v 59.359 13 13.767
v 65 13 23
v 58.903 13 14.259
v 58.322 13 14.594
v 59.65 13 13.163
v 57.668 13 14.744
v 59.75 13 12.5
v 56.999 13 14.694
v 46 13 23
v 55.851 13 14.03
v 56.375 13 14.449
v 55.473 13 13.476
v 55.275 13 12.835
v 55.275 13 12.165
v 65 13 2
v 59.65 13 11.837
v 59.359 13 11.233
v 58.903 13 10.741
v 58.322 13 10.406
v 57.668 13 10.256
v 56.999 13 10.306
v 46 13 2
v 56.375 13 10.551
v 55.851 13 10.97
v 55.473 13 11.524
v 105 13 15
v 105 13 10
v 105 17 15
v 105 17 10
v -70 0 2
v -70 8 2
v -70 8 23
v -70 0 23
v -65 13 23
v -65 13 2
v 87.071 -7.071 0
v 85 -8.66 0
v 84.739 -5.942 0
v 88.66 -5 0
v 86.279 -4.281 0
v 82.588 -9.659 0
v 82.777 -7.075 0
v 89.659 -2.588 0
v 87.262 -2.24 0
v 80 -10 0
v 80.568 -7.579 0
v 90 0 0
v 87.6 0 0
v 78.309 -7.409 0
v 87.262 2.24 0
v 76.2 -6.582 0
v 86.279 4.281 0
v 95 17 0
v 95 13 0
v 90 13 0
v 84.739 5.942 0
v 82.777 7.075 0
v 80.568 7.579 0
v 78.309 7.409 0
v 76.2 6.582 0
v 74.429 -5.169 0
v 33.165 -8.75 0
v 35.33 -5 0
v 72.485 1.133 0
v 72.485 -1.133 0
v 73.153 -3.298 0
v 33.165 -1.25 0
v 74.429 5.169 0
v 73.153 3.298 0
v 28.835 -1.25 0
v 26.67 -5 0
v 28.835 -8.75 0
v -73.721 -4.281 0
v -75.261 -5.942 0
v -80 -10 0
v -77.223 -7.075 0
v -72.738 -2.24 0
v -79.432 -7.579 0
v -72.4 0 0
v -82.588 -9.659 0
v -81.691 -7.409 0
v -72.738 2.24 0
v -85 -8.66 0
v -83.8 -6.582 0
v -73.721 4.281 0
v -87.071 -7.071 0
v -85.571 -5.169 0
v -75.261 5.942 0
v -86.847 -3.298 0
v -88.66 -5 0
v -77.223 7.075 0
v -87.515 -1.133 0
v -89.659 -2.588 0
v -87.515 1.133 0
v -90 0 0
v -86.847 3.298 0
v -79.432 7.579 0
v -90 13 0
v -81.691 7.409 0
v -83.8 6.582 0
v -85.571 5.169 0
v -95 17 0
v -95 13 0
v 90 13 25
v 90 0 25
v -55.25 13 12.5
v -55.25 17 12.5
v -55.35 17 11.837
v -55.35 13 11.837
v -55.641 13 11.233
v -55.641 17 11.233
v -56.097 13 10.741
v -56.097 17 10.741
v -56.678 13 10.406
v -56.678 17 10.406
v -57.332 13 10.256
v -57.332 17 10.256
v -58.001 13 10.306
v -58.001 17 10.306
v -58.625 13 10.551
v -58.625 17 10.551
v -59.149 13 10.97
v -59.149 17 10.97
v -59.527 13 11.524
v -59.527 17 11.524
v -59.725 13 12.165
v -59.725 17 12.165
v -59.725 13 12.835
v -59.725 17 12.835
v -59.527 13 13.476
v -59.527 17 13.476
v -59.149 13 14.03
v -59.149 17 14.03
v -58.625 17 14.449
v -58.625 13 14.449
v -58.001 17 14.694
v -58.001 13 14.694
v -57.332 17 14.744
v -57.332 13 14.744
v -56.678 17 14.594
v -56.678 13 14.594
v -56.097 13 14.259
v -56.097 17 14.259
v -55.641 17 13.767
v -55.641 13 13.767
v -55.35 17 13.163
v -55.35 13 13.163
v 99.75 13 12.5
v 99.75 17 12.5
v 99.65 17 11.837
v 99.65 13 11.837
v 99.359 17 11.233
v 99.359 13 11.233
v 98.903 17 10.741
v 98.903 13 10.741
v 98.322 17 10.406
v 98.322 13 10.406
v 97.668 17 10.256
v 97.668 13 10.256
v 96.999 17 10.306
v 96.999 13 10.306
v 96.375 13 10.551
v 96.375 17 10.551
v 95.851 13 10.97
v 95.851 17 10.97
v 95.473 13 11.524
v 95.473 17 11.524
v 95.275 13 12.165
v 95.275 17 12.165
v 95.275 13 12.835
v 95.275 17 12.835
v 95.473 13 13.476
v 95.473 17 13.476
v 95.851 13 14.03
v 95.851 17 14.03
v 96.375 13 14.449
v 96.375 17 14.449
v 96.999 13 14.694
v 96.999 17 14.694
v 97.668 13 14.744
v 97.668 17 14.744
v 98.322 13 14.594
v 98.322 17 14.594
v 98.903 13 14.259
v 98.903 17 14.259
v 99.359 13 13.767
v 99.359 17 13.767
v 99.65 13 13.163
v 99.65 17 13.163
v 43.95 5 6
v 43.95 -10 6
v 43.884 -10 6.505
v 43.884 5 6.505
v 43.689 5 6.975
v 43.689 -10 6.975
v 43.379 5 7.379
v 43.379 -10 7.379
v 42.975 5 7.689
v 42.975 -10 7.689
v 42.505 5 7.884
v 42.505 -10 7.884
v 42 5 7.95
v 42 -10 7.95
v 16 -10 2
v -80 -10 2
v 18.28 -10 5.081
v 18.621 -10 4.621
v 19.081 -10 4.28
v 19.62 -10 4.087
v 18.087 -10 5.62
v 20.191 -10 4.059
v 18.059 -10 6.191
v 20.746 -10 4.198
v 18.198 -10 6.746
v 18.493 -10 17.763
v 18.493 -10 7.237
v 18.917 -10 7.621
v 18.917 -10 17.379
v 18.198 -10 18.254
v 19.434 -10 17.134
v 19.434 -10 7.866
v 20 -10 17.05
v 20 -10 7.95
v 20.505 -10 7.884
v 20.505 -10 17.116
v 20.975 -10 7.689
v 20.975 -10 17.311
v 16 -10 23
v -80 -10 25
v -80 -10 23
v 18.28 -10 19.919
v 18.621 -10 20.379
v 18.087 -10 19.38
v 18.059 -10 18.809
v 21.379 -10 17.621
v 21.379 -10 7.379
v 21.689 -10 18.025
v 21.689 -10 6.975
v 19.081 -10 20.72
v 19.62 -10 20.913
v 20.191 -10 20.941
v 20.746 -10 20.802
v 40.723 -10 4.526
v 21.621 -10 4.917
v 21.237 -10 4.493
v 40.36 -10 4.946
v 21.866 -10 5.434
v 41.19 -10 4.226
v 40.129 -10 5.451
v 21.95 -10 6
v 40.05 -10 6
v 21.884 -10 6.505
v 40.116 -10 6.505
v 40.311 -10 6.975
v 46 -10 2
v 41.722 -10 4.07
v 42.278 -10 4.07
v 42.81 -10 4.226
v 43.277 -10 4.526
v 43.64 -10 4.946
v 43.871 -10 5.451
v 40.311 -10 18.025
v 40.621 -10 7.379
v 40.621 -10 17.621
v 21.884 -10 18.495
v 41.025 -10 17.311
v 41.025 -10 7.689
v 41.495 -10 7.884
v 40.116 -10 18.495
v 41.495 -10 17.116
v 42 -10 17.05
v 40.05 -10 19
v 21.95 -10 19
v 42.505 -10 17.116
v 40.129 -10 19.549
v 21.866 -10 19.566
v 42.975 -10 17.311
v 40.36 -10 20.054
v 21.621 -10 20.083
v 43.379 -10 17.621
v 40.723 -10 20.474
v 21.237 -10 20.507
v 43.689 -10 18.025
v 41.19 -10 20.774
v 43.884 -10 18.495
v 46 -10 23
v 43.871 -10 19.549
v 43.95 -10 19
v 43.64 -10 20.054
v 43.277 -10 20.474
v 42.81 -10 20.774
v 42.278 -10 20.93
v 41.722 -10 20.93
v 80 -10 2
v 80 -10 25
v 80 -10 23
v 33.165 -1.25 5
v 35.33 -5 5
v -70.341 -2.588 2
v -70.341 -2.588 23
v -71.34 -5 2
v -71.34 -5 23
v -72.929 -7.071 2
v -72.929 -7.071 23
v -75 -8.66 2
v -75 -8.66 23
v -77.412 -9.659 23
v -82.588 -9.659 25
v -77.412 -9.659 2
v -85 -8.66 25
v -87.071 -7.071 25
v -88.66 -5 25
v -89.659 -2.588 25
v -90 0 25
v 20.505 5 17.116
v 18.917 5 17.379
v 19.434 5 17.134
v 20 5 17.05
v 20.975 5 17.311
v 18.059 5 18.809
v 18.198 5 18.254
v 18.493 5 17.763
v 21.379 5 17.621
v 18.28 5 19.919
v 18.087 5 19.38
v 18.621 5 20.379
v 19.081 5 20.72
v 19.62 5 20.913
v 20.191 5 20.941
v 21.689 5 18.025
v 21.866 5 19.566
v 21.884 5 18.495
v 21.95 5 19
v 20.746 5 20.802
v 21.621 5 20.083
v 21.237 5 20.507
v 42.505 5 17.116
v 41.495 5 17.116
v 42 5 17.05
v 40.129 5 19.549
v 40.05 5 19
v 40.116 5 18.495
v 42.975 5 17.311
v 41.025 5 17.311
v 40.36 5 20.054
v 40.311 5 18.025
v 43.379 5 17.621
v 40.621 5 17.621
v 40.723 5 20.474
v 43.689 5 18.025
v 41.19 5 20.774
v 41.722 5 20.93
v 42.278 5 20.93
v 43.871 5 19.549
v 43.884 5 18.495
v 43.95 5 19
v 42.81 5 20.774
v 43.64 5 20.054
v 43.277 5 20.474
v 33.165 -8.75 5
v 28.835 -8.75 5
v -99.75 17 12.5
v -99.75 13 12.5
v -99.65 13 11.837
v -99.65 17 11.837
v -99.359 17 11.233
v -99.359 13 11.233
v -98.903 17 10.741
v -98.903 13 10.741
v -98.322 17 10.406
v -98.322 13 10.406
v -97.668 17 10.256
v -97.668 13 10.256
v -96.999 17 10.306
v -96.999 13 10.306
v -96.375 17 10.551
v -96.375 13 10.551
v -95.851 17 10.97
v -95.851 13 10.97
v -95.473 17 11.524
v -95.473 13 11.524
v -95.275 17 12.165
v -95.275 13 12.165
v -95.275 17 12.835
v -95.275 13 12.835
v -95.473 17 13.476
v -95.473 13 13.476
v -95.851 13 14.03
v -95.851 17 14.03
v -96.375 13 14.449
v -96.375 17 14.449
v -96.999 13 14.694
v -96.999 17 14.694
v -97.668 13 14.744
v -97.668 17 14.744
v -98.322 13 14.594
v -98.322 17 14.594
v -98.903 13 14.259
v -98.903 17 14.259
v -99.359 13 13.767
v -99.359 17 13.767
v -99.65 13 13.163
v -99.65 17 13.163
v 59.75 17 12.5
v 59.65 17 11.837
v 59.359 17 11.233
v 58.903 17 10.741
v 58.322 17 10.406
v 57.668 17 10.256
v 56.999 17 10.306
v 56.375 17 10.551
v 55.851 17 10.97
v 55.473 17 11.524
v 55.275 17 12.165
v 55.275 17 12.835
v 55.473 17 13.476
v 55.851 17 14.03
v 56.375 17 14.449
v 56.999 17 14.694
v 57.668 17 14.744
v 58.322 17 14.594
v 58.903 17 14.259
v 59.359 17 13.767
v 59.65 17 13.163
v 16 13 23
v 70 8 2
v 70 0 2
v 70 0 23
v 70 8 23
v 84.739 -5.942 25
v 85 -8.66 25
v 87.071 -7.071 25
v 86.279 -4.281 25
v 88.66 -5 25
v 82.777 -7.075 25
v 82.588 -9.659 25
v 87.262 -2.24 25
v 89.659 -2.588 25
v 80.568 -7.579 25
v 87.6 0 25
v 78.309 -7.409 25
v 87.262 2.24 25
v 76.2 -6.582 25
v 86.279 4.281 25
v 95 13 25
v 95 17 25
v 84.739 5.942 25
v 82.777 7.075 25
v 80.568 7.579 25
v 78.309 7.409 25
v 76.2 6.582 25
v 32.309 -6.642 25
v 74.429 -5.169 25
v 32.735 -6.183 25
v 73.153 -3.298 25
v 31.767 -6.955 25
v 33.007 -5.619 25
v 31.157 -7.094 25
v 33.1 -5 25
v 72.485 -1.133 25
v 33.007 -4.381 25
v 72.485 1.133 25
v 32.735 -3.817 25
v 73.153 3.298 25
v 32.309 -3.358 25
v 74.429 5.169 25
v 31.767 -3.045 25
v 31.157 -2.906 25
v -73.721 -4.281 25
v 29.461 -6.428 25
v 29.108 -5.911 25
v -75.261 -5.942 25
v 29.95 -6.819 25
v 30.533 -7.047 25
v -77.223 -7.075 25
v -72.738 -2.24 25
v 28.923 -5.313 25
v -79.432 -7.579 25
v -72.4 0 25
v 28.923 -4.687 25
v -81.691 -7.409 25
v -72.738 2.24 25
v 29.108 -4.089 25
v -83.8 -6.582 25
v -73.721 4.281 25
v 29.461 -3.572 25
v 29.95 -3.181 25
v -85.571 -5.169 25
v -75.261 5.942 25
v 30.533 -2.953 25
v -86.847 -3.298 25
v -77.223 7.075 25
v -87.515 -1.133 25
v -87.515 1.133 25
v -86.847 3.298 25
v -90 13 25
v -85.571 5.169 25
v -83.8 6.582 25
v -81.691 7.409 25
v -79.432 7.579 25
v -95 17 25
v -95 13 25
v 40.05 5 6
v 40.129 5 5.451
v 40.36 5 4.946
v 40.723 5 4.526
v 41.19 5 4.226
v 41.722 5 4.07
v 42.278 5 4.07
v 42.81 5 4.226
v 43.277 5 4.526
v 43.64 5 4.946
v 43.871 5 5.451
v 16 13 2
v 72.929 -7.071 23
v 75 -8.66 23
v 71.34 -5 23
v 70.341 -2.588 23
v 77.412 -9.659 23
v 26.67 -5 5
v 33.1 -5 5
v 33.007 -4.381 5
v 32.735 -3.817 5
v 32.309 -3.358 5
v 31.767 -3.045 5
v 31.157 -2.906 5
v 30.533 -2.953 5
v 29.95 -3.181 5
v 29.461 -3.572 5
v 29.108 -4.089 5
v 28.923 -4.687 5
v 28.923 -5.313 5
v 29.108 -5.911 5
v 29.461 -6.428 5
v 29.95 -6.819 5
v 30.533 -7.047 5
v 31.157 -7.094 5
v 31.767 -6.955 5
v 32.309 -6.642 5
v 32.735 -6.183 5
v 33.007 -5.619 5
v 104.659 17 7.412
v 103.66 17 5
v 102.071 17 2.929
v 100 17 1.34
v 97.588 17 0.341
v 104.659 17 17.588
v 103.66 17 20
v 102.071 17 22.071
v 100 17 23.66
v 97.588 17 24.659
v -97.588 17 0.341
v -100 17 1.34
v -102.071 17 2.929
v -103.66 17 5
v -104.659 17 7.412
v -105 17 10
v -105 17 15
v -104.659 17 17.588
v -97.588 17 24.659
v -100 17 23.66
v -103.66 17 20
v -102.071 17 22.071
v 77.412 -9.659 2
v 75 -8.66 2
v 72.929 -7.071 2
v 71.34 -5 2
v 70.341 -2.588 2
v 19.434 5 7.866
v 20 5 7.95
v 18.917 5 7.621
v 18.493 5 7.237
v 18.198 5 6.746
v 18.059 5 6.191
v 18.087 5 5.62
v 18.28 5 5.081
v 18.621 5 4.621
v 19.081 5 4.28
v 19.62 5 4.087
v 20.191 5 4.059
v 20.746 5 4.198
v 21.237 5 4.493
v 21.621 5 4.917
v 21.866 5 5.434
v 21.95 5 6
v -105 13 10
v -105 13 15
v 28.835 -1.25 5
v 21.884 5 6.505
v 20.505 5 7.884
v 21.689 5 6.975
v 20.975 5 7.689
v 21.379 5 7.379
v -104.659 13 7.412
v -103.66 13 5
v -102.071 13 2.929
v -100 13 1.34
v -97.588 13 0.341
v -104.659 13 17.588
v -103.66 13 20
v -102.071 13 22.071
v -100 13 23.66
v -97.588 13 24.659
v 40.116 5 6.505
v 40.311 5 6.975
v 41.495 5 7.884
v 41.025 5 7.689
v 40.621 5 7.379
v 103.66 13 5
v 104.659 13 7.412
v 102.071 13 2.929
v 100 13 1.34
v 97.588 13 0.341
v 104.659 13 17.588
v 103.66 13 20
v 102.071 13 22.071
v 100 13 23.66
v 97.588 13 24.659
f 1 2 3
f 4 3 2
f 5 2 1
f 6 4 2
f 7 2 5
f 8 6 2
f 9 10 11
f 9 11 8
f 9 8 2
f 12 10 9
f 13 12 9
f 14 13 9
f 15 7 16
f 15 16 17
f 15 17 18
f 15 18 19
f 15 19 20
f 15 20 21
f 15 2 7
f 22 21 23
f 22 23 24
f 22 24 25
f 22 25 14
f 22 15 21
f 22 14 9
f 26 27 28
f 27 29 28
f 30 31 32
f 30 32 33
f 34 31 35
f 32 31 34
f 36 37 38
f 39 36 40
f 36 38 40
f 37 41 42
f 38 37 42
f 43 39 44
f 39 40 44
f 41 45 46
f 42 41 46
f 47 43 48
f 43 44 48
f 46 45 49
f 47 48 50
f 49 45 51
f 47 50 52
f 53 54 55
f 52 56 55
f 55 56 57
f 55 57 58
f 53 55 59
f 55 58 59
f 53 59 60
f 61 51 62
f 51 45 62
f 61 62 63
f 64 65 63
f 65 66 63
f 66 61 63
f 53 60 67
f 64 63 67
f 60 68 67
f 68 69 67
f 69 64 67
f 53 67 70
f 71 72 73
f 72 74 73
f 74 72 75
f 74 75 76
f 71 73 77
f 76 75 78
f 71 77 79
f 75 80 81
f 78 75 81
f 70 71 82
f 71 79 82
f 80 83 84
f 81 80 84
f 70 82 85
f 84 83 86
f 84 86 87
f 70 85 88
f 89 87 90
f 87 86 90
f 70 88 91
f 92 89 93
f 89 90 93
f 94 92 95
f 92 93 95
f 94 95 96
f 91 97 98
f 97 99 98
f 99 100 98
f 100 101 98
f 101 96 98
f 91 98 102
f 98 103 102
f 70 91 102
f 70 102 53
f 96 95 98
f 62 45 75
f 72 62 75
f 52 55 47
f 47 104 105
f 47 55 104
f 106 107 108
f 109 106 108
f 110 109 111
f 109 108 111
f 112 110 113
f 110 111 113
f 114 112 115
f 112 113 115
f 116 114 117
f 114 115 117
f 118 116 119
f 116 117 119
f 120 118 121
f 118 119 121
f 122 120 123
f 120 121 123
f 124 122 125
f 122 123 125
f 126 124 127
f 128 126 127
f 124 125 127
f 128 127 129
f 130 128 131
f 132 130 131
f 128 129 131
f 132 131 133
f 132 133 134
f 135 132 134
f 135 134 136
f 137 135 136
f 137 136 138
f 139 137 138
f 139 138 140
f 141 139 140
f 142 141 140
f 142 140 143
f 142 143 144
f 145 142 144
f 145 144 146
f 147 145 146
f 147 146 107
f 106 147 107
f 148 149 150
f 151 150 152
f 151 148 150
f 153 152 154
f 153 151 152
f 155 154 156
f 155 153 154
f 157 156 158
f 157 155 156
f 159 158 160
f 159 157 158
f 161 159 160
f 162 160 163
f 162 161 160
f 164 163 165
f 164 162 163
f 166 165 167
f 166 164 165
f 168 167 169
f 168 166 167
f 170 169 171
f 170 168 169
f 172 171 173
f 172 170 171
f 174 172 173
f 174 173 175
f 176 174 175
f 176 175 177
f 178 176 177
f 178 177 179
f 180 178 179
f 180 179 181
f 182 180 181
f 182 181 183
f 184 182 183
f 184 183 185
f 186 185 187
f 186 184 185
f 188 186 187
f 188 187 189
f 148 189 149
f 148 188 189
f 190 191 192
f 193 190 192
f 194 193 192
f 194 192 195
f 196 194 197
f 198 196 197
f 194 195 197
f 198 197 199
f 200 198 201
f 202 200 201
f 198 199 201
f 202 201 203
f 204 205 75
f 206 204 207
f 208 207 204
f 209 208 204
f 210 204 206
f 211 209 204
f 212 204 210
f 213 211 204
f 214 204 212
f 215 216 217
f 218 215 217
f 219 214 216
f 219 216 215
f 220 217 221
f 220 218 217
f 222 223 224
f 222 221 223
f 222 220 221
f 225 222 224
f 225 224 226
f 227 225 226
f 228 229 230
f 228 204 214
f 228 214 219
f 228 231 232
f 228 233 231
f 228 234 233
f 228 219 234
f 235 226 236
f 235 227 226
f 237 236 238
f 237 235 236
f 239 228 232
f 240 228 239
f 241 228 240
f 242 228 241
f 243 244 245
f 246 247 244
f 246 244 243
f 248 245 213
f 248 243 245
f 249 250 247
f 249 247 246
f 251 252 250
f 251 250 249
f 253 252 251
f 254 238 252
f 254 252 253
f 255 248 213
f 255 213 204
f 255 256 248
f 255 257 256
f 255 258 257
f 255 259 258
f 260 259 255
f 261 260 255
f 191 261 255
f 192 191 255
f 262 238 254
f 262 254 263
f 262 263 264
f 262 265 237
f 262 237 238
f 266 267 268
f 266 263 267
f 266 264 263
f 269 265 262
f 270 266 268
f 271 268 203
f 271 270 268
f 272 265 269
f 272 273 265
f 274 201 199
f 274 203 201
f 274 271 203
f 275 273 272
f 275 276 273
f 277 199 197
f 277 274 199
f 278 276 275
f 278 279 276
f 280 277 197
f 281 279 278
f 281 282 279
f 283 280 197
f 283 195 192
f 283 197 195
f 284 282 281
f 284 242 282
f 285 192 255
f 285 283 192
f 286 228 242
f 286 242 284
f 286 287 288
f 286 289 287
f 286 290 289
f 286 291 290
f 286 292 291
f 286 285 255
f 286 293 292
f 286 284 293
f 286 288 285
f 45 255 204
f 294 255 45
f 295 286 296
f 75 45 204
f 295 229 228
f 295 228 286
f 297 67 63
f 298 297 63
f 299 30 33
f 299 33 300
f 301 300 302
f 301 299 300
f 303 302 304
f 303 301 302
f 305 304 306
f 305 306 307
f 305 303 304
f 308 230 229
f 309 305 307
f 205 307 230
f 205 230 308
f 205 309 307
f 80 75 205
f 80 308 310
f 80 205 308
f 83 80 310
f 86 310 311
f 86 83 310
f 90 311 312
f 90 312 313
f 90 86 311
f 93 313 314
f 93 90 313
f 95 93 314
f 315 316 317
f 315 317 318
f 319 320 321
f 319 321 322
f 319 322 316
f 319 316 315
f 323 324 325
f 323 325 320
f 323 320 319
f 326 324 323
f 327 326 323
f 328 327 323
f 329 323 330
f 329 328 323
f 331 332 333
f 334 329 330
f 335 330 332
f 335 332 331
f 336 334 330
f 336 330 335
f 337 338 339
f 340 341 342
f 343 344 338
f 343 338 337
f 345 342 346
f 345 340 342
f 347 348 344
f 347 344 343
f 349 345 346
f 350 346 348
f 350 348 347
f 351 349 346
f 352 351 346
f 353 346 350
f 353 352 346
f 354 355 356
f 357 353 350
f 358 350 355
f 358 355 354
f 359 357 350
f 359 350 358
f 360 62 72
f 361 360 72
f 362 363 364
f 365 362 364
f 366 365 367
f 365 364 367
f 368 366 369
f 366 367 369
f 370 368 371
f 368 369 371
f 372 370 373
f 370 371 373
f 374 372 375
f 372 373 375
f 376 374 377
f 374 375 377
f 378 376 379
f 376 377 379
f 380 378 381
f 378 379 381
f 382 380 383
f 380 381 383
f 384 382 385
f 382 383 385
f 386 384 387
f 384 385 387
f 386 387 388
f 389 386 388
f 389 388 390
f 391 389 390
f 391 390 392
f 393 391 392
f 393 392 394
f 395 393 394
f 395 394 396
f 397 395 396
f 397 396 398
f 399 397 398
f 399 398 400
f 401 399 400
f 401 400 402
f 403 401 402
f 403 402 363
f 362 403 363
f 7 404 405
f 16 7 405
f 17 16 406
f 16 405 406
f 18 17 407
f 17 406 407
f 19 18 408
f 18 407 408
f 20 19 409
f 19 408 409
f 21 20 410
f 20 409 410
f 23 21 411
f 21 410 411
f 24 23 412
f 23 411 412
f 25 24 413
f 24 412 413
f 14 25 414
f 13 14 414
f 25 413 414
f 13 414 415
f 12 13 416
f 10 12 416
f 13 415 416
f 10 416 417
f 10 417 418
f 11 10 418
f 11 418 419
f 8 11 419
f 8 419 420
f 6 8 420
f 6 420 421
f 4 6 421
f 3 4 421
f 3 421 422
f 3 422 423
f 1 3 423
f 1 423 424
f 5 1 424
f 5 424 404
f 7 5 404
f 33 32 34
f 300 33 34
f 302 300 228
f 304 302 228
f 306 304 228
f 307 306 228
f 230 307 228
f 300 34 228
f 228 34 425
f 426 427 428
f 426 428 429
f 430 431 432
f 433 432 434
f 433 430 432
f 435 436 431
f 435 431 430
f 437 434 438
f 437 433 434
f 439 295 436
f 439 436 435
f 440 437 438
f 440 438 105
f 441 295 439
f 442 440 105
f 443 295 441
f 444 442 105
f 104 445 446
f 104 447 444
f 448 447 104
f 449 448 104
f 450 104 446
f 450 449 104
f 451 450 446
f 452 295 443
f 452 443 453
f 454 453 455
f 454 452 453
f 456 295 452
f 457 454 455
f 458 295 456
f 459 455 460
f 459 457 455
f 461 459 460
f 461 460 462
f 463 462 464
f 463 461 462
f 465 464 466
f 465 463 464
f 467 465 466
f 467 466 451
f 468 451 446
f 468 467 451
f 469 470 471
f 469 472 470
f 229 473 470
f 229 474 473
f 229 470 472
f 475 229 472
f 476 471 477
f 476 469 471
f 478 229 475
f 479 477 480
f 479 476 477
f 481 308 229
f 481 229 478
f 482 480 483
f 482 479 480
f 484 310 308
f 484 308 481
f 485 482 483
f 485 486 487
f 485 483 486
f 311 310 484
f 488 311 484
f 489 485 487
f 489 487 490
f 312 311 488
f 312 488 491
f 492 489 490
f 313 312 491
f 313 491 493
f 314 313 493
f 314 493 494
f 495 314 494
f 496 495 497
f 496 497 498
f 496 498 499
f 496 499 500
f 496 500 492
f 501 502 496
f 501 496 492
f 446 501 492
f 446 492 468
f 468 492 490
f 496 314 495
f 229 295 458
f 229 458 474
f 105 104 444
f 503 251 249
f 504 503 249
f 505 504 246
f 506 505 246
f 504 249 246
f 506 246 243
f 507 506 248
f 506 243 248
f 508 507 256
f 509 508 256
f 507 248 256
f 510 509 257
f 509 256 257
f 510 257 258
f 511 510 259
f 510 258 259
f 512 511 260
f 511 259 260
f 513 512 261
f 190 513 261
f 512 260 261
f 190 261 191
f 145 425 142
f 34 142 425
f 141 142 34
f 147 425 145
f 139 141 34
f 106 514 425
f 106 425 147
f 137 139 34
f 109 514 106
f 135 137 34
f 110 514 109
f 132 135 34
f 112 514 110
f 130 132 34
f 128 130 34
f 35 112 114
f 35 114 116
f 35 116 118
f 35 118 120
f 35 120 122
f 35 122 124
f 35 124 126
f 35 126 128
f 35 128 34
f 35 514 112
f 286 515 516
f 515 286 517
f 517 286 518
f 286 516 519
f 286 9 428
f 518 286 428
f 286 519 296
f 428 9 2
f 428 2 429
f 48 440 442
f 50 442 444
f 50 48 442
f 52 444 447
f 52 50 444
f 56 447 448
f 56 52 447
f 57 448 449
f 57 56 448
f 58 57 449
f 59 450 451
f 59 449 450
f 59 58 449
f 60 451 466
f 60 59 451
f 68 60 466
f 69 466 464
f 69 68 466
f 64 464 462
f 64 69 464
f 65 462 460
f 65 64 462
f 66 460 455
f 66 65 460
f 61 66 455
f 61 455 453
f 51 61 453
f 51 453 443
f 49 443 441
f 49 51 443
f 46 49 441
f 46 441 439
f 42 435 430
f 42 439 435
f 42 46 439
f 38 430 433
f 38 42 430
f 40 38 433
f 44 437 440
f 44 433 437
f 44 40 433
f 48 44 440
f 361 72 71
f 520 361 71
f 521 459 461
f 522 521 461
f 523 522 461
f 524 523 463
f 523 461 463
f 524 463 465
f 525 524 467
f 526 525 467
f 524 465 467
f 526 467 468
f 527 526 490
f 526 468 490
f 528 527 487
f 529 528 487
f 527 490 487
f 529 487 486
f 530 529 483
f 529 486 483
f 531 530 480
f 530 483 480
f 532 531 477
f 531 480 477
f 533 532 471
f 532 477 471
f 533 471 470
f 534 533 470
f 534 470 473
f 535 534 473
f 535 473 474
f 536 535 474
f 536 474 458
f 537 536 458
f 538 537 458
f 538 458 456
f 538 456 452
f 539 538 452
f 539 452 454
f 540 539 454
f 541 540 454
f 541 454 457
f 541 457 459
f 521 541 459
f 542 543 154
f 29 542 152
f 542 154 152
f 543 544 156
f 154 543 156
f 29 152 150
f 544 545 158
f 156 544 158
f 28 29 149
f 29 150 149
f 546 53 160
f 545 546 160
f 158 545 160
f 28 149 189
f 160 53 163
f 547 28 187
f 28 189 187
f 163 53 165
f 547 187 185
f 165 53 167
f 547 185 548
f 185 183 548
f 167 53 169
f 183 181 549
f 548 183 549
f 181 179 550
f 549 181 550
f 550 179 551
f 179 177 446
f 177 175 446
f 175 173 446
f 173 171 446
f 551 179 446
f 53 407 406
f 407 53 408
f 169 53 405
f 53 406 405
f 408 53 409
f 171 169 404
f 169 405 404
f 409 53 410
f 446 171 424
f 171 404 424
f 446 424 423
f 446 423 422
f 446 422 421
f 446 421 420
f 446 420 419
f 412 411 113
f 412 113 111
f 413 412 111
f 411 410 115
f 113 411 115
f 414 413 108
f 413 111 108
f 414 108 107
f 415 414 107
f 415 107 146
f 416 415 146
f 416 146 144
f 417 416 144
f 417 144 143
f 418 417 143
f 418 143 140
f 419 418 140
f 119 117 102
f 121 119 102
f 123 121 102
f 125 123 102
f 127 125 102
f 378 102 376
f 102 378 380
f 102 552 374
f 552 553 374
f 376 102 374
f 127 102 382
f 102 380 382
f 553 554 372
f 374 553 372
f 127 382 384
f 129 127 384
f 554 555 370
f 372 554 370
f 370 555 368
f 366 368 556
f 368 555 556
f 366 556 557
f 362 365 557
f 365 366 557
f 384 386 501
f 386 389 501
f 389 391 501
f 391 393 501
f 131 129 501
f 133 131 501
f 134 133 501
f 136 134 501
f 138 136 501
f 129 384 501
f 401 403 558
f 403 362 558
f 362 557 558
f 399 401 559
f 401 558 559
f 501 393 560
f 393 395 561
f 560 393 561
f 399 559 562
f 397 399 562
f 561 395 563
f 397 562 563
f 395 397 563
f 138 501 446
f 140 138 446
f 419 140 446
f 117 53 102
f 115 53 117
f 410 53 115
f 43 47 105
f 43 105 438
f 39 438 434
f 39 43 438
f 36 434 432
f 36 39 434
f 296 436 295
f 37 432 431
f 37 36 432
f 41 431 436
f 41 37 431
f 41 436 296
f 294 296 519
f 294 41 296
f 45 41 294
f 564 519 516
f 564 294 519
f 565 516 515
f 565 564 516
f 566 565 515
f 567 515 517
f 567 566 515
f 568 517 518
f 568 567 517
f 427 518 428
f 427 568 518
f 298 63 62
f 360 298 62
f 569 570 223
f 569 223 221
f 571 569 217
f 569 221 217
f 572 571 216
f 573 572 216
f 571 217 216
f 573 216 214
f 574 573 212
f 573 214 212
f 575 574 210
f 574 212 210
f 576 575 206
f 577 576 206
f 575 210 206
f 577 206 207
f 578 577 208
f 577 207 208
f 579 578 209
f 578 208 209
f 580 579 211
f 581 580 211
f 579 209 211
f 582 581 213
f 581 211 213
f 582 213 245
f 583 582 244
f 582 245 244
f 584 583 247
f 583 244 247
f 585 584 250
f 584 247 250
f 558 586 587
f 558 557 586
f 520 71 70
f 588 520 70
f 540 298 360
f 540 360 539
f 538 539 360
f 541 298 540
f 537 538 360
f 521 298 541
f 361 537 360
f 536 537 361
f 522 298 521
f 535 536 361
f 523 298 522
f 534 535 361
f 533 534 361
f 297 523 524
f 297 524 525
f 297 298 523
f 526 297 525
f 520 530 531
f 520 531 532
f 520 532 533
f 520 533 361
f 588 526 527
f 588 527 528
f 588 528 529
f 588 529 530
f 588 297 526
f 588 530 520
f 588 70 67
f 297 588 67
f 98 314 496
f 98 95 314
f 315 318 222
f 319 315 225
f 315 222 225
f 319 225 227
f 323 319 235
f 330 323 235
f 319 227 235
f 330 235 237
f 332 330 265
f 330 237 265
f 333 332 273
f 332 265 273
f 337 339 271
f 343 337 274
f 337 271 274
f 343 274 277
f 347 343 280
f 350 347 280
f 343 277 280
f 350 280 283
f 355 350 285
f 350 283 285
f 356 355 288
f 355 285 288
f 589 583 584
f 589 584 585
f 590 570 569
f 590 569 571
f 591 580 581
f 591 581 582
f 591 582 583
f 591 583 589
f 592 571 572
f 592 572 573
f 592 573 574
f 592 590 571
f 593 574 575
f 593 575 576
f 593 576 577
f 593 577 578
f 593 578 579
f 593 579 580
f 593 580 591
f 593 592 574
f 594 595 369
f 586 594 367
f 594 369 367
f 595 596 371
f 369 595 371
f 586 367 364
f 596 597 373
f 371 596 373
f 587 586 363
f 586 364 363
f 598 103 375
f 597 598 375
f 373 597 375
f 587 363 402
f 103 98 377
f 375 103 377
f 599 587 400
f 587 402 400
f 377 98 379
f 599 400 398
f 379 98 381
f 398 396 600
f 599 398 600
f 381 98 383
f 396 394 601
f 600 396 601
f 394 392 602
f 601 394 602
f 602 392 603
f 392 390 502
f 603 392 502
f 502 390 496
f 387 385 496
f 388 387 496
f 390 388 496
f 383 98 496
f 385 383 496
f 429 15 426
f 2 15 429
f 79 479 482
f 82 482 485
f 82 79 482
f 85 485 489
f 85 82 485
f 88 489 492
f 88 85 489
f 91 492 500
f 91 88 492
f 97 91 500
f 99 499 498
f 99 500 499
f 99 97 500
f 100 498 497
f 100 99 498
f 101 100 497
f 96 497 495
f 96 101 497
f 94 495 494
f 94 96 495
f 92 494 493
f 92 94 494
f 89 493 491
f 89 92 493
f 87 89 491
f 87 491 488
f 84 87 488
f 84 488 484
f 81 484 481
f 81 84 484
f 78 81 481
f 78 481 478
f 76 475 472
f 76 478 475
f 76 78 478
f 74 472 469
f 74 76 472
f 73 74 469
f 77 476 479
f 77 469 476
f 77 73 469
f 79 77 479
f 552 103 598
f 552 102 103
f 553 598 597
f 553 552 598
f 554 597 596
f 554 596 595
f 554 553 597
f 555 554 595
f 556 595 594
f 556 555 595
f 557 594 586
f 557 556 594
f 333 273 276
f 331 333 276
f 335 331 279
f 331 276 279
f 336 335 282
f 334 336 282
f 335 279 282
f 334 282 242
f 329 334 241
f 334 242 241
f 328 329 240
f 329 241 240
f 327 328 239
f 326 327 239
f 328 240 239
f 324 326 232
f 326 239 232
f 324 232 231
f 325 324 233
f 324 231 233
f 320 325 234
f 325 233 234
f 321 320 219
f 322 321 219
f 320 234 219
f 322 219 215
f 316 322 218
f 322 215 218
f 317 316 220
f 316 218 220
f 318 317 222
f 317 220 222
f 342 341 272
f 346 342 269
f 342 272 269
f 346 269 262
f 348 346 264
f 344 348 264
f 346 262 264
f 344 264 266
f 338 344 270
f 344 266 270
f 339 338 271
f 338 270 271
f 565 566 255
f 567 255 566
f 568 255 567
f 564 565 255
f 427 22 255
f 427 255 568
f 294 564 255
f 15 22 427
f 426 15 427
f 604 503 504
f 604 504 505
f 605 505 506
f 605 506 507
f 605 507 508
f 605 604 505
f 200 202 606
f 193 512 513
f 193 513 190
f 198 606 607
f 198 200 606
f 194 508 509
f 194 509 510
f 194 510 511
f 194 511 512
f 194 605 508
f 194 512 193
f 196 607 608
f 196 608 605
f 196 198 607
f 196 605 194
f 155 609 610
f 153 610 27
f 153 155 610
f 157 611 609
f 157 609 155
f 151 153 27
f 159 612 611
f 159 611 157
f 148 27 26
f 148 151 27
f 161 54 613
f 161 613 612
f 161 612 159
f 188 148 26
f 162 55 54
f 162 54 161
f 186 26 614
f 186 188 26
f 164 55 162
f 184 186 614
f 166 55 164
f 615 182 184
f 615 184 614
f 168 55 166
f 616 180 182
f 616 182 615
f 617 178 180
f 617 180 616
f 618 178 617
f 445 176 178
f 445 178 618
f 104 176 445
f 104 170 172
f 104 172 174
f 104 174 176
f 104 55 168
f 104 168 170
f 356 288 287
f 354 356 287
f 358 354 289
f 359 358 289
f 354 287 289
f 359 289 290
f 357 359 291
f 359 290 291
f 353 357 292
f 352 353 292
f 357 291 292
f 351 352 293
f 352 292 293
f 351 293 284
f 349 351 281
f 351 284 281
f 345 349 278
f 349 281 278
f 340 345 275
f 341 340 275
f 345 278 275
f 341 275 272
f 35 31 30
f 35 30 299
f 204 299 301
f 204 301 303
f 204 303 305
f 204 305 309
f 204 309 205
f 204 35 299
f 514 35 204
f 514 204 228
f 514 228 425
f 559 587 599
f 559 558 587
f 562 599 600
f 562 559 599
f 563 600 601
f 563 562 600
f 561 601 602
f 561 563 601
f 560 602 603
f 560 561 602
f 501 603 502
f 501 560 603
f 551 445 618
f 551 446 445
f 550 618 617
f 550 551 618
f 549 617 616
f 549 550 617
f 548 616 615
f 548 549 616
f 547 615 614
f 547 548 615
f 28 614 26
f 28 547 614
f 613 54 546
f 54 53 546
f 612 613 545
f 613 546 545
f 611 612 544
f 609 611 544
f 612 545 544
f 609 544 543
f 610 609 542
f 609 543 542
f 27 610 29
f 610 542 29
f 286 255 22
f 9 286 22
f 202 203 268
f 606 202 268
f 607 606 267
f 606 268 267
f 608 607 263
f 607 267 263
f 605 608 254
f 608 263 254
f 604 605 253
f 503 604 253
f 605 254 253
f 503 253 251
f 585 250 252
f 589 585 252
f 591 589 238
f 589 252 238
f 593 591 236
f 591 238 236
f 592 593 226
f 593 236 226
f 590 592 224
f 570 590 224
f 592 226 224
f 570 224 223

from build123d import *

# Parameters (mm, degrees)
SKETCH1_R            = 7.6
BOSS_EXTRUDE1_DEPTH  = 25
SKETCH2_W            = 30
SKETCH2_H            = 27
BOSS_EXTRUDE2_DEPTH  = 25
SKETCH3_R            = 7.6
BOSS_EXTRUDE3_DEPTH  = 2
CHAMFER1_SIZE        = 5
SKETCH5_W            = 25
SKETCH5_H            = 4
BOSS_EXTRUDE4_DEPTH  = 15
SKETCH6_R            = 2.25
CUT_EXTRUDE2_DEPTH   = 15
FILLET1_R            = 10
FILLET1_OF_MIRROR2_R = 10
SKETCH7_R            = 2.25
CUT_EXTRUDE3_DEPTH   = 15
CUT_EXTRUDE4_DEPTH   = 15
SKETCH9_R            = 2.1
CUT_EXTRUDE5_DEPTH   = 28.468092804
CUT_EXTRUDE6_DEPTH   = 5


with BuildPart() as part:
    # Sketch1 → Boss-Extrude1 (new body)
    with BuildSketch(Plane.XY):
        with BuildLine():
            Line((-90, 0), (-90, 17))
            Line((-90, 17), (90, 17))
            Line((90, 17), (90, 0))
            ThreePointArc((90, 0), (80, -10), (70, 0))
            Line((70, 0), (70, 13))
            Line((70, 13), (-70, 13))
            Line((-70, 13), (-70, 0))
            ThreePointArc((-70, 0), (-80, -10), (-90, 0))
        make_face()
        with Locations((-80, 0)):
            Circle(SKETCH1_R, mode=Mode.SUBTRACT)
        with Locations((80, 0)):
            Circle(SKETCH1_R, mode=Mode.SUBTRACT)
    extrude(amount=BOSS_EXTRUDE1_DEPTH)

    # Sketch2 → Boss-Extrude2 (add)
    with BuildSketch(Plane(origin=(0, 0, 0), x_dir=(-1, 0, 0), z_dir=(0, 0, -1))):
        with Locations((-31, 3.5)):
            Rectangle(SKETCH2_W, SKETCH2_H)
    extrude(amount=-BOSS_EXTRUDE2_DEPTH)

    # Sketch3 → Boss-Extrude3 (add)
    with BuildSketch(Plane(origin=(0, 0, 0), x_dir=(-1, 0, 0), z_dir=(0, 0, -1))):
        with BuildLine():
            Line((80, -10), (-12, -10))
            Line((-12, -10), (-42, -10))
            Line((-42, -10), (-80, -10))
            ThreePointArc((-80, -10), (-87.071067812, -7.071067812), (-90, 0))
            Line((-90, 0), (-90, 17))
            Line((-90, 17), (90, 17))
            Line((90, 17), (90, 0))
            ThreePointArc((90, 0), (87.071067812, -7.071067812), (80, -10))
        make_face()
        with Locations((80, 0)):
            Circle(SKETCH3_R, mode=Mode.SUBTRACT)
        with Locations((-80, 0)):
            Circle(SKETCH3_R, mode=Mode.SUBTRACT)
    boss_extrude3 = extrude(amount=-BOSS_EXTRUDE3_DEPTH)

    # Mirror1: Boss-Extrude3 across plane
    add(boss_extrude3.mirror(Plane.XY.offset(12.5)))

    # Chamfer1
    chamfer1_edges = [part.edges().sort_by_distance(p)[0] for p in [
        (70, 13, 12.5),
        (-70, 13, 12.5),
    ]]
    chamfer(chamfer1_edges, length=CHAMFER1_SIZE)

    # Sketch5 → Boss-Extrude4 (add)
    with BuildSketch(Plane.ZY.offset(90)):
        with Locations((12.5, 15)):
            Rectangle(SKETCH5_W, SKETCH5_H)
    boss_extrude4 = extrude(amount=BOSS_EXTRUDE4_DEPTH)

    # Sketch6 → Cut-Extrude2 (cut)
    with BuildSketch(Plane(origin=(0, 13, 0), x_dir=(-1, 0, 0), z_dir=(0, -1, 0))):
        with Locations((97.5, -12.5)):
            Circle(SKETCH6_R)
    cut_extrude2 = extrude(amount=-CUT_EXTRUDE2_DEPTH, mode=Mode.SUBTRACT)

    # Fillet1
    fillet1_edges = [part.edges().sort_by_distance(p)[0] for p in [
        (-105, 15, 0),
        (-105, 15, 25),
    ]]
    fillet(fillet1_edges, radius=FILLET1_R)

    # Mirror2: Boss-Extrude4 across plane
    add(boss_extrude4.mirror(Plane(origin=(0, 0, 0), x_dir=(0, 0, 1), z_dir=(1, 0, 0))))

    # Fillet1 of Mirror2
    fillet1_of_mirror2_edges = [part.edges().sort_by_distance(p)[0] for p in [
        (105, 15, 0),
        (105, 15, 25),
    ]]
    fillet(fillet1_of_mirror2_edges, radius=FILLET1_OF_MIRROR2_R)

    # Mirror4: Cut-Extrude2 across plane
    add(cut_extrude2.mirror(Plane(origin=(0, 0, 0), x_dir=(0, 0, 1), z_dir=(1, 0, 0))), mode=Mode.SUBTRACT)

    # Sketch7 → Cut-Extrude3 (cut)
    with BuildSketch(Plane(origin=(0, 17, 0), x_dir=(1, 0, 0), z_dir=(0, 1, 0))):
        with Locations((-57.5, -12.5)):
            Circle(SKETCH7_R)
        with Locations((57.5, -12.5)):
            Circle(SKETCH7_R)
    extrude(amount=-CUT_EXTRUDE3_DEPTH, mode=Mode.SUBTRACT)

    # Sketch8 → Cut-Extrude4 (cut)
    with BuildSketch(Plane.XZ.offset(10)):
        with BuildLine():
            Line((21.95, 19), (20, 19))
            Line((20, 19), (20, 17.05))
            ThreePointArc((20, 17.05), (21.378858223, 17.621141777), (21.95, 19))
        make_face()
        with BuildLine():
            Line((20, 17.05), (20, 19))
            Line((20, 19), (21.95, 19))
            ThreePointArc((21.95, 19), (18.621141777, 20.378858223), (20, 17.05))
        make_face()
        with BuildLine():
            ThreePointArc((43.95, 19), (42, 20.95), (40.05, 19))
            Line((40.05, 19), (42, 19))
            Line((42, 19), (42, 17.05))
            ThreePointArc((42, 17.05), (43.378858223, 17.621141777), (43.95, 19))
        make_face()
        with BuildLine():
            Line((42, 19), (40.05, 19))
            ThreePointArc((40.05, 19), (40.621141777, 17.621141777), (42, 17.05))
            Line((42, 17.05), (42, 19))
        make_face()
        with BuildLine():
            ThreePointArc((42, 7.95), (40.621141777, 7.378858223), (40.05, 6))
            Line((40.05, 6), (42, 6))
            Line((42, 6), (42, 7.95))
        make_face()
        with BuildLine():
            Line((42, 6), (40.05, 6))
            ThreePointArc((40.05, 6), (42, 4.05), (43.95, 6))
            ThreePointArc((43.95, 6), (43.378858223, 7.378858223), (42, 7.95))
            Line((42, 7.95), (42, 6))
        make_face()
        with BuildLine():
            ThreePointArc((21.95, 6), (21.378858223, 7.378858223), (20, 7.95))
            Line((20, 7.95), (20, 6))
            Line((20, 6), (21.95, 6))
        make_face()
        with BuildLine():
            Line((20, 6), (20, 7.95))
            ThreePointArc((20, 7.95), (18.621141777, 4.621141777), (21.95, 6))
            Line((21.95, 6), (20, 6))
        make_face()
    extrude(amount=-CUT_EXTRUDE4_DEPTH, mode=Mode.SUBTRACT)

    # Sketch9 → Cut-Extrude5 (cut)
    with BuildSketch(Plane.XY.offset(25)):
        with Locations((31, -5)):
            Circle(SKETCH9_R)
    extrude(amount=-CUT_EXTRUDE5_DEPTH, mode=Mode.SUBTRACT)

    # Sketch10 → Cut-Extrude6 (cut)
    with BuildSketch(Plane(origin=(0, 0, 0), x_dir=(-1, 0, 0), z_dir=(0, 0, -1))):
        Polygon((-26.669872981, -5), (-28.834936491, -1.25), (-33.165063509, -1.25), (-35.330127019, -5), (-33.165063509, -8.75), (-28.834936491, -8.75), align=None)
    extrude(amount=-CUT_EXTRUDE6_DEPTH, mode=Mode.SUBTRACT)


solid = part.part
